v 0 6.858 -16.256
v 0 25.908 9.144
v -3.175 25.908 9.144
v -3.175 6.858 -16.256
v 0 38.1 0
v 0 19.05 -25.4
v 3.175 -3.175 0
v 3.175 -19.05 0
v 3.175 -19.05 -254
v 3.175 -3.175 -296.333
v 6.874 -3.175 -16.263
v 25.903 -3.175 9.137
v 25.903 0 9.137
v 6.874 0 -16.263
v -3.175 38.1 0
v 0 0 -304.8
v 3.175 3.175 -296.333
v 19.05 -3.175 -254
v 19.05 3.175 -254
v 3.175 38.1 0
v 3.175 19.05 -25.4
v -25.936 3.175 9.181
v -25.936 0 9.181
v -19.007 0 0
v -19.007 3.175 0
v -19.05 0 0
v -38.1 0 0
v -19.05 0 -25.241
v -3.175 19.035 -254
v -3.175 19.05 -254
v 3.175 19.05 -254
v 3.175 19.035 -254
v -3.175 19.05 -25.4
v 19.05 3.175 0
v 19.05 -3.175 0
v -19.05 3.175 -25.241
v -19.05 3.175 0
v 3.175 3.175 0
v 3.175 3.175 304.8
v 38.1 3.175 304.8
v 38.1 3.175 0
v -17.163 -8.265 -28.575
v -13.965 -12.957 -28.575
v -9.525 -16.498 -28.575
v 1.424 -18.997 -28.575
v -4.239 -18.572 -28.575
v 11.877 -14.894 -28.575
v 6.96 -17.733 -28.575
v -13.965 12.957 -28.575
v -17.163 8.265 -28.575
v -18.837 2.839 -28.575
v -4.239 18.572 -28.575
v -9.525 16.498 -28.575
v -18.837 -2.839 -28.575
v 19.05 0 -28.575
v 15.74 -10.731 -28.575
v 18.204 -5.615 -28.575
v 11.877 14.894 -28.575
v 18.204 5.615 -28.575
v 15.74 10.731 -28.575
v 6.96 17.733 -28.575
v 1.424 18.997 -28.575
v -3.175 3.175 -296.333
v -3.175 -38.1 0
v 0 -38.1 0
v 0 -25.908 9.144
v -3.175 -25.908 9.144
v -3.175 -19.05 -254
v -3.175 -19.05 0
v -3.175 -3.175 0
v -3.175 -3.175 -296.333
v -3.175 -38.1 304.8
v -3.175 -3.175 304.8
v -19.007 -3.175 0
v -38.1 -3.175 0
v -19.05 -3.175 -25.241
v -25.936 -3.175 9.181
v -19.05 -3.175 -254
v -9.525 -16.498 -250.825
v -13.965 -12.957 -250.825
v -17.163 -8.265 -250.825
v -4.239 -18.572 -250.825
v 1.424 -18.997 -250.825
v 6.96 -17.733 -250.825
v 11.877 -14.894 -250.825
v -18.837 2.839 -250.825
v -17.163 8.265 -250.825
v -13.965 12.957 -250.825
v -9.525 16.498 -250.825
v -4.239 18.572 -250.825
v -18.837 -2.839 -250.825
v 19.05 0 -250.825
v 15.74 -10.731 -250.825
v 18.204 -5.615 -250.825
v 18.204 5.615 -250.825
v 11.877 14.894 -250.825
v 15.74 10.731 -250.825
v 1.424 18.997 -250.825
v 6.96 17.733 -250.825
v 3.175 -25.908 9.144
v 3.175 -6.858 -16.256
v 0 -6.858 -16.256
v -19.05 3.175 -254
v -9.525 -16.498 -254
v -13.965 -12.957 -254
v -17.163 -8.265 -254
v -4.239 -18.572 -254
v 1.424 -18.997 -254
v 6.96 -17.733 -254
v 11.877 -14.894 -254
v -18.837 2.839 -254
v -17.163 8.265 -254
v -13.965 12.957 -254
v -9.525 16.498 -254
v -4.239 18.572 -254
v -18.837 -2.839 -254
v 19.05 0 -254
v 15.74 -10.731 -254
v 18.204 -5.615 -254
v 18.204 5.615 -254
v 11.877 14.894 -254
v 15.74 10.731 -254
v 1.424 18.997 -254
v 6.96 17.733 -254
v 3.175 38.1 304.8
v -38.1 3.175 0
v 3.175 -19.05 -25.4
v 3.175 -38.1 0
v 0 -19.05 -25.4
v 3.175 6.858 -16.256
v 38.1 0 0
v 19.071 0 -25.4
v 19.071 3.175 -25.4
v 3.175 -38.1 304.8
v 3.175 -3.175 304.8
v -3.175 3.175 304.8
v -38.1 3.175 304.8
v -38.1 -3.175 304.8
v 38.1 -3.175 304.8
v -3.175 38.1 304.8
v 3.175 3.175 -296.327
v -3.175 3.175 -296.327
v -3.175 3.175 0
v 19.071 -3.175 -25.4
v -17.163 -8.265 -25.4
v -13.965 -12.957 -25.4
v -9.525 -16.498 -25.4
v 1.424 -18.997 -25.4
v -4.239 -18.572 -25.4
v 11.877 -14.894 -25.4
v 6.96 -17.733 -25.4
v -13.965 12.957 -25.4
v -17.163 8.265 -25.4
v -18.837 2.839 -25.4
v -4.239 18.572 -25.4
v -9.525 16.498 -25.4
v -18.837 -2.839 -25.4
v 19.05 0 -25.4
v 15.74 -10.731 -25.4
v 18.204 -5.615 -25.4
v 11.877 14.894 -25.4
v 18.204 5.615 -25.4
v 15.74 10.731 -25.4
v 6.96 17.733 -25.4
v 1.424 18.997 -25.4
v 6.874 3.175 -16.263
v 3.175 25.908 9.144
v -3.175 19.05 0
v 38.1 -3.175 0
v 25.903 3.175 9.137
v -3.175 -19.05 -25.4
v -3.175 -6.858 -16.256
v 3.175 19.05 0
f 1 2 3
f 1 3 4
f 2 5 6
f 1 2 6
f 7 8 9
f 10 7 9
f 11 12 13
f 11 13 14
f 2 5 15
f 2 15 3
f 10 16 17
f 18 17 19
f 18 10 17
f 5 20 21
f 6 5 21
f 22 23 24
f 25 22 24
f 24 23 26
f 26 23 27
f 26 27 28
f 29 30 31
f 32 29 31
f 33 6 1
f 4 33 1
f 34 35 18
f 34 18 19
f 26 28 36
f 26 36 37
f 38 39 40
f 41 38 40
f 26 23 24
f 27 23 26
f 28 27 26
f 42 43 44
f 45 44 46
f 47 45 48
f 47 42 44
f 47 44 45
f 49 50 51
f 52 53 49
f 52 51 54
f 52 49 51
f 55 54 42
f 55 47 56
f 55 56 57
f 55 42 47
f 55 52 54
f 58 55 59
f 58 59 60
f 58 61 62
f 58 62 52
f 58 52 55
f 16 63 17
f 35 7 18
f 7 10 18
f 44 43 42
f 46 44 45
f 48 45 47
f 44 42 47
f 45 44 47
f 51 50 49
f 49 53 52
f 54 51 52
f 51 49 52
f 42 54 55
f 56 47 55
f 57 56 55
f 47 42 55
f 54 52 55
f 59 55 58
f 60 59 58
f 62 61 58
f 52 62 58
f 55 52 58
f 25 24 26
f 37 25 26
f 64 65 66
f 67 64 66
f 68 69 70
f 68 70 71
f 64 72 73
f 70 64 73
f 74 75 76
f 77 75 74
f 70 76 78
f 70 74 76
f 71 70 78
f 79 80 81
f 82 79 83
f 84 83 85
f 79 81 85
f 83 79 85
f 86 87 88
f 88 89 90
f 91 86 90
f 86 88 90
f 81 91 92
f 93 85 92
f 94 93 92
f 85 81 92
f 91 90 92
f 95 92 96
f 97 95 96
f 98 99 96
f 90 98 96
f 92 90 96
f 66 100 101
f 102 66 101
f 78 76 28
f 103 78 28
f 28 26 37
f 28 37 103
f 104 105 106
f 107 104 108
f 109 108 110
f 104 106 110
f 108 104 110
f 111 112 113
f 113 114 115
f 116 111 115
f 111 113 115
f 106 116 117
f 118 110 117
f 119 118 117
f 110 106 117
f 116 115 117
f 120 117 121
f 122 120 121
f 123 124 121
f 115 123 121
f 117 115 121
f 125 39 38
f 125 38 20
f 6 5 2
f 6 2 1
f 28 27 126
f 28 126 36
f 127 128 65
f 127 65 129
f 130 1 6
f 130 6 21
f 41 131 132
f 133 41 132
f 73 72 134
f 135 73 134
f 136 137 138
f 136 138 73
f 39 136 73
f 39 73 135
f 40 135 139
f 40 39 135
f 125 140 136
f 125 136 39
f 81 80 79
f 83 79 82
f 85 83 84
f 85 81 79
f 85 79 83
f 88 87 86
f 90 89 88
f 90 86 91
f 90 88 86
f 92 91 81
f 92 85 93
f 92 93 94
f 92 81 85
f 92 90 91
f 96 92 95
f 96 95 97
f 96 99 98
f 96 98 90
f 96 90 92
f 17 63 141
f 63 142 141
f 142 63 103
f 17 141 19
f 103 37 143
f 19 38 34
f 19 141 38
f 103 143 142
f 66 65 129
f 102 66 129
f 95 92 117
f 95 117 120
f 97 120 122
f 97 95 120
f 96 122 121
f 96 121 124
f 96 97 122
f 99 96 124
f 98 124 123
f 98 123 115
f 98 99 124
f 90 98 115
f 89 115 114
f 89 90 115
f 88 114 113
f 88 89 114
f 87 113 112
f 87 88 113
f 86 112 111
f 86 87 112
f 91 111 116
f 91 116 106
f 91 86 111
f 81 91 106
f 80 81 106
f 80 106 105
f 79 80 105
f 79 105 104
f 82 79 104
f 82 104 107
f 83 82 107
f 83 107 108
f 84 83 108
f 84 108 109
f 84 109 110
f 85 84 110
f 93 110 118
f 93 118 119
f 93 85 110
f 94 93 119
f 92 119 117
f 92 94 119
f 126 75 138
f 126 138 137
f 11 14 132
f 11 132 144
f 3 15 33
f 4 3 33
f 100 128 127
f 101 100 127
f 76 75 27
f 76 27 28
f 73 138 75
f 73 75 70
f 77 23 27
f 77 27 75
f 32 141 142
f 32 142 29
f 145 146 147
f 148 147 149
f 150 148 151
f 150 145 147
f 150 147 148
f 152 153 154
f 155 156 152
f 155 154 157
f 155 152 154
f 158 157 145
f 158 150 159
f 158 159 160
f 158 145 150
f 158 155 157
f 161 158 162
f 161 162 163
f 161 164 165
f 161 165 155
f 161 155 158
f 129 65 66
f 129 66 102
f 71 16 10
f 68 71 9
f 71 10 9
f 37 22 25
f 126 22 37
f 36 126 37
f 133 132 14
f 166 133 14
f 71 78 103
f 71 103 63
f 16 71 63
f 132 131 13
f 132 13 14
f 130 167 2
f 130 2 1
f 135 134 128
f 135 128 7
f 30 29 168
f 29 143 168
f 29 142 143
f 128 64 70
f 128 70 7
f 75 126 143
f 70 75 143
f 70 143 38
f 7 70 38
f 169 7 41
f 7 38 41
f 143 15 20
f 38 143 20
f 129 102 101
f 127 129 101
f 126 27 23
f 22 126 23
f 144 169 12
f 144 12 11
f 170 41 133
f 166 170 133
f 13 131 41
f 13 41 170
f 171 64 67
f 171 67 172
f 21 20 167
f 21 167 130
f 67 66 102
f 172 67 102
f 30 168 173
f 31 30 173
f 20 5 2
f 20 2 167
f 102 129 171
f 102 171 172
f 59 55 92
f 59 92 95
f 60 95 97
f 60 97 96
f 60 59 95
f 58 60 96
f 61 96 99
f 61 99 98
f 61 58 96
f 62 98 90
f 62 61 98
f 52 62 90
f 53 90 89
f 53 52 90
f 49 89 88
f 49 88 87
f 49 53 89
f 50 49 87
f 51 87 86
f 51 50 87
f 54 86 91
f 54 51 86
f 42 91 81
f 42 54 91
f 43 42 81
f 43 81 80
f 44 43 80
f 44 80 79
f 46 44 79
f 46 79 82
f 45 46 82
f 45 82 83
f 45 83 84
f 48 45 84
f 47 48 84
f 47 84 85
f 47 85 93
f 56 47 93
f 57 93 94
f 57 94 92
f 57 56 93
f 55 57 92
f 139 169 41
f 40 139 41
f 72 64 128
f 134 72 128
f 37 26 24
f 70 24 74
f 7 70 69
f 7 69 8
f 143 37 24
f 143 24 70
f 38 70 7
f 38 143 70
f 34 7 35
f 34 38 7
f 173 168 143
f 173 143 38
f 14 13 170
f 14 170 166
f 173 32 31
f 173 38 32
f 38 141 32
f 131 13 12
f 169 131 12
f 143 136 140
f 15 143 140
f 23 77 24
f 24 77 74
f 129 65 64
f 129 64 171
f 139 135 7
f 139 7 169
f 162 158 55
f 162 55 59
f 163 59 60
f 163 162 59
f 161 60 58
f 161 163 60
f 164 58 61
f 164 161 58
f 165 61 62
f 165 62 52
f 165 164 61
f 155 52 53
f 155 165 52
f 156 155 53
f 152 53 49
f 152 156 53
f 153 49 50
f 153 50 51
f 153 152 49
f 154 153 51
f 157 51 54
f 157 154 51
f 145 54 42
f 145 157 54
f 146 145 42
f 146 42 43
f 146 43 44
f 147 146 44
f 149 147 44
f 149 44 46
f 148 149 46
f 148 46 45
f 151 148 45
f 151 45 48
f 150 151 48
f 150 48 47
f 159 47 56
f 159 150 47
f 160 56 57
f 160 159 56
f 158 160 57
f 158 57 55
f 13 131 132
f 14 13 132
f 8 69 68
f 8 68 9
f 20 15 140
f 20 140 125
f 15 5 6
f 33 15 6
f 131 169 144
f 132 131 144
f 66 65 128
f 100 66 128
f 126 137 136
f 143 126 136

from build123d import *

# Parameters (mm, degrees)
F0_W           = 6.35
F0_H           = 34.925
F0_W_2         = 34.925
F0_H_2         = 6.35
F1_DEPTH       = 304.8
F2_W           = 15.875
F2_H           = 6.35
F2_W_2         = 6.35
F2_H_2         = 15.875
F3_DEPTH       = 254
F5_E4_W        = 31.7372608571
F5_E4_H        = 3.175
F6_DEPTH       = 15.24
F7_DEPTH       = 3.175
F9_E5_W        = 31.8220023402
F9_E5_H        = 3.175
F10_DEPTH      = 15.24
F11_DEPTH      = 3.175
F13_E6_W       = 31.75
F13_E6_H       = 3.175
F14_DEPTH      = 15.24
F15_DEPTH      = 3.175
F16_E7_W       = 31.75
F16_E7_H       = 3.175
F17_DEPTH      = 15.24
F18_DEPTH      = 3.175
F20_START      = -28.575
F19_R          = 19.05
F20_DEPTH      = 222.25
F22_START      = -25.4
F21_R          = 19.05
F22_DEPTH      = 3.175
F24_START      = -250.825
F23_R          = 19.05
F24_DEPTH      = 3.175
F26_DEPTH      = 3.175
F26_DEPTH_BACK = 3.175
F28_DEPTH      = 3.175
F28_DEPTH_BACK = 3.175
F30_DEPTH      = 25.4
F30_DEPTH_BACK = 25.4
F32_DEPTH      = 25.4
F32_DEPTH_BACK = 25.4
F34_DEPTH      = 25.4
F34_DEPTH_BACK = 25.4
F36_DEPTH      = 25.4
F36_DEPTH_BACK = 25.4


with BuildPart() as f1:
    # F0 (on Top) → F1 (new body)
    with BuildSketch(Plane.XY):
        with Locations((0, 20.6375)):
            Rectangle(F0_W, F0_H)
        with Locations((-20.6375, 0)):
            Rectangle(F0_W_2, F0_H_2)
        with Locations((0, -20.6375)):
            Rectangle(F0_W, F0_H)
        Rectangle(F0_W, F0_H_2)
        with Locations((20.6375, 0)):
            Rectangle(F0_W_2, F0_H_2)
    extrude(amount=F1_DEPTH)


with BuildPart() as f3:
    # F2 (on Top) → F3 (new body)
    with BuildSketch(Plane.XY):
        with Locations((11.1125, 0)):
            Rectangle(F2_W, F2_H)
        with Locations((-11.1125, 0)):
            Rectangle(F2_W, F2_H)
        with Locations((0, 11.1125)):
            Rectangle(F2_W_2, F2_H_2)
        with Locations((0, -11.1125)):
            Rectangle(F2_W_2, F2_H_2)
        Rectangle(F2_W_2, F2_H)
    extrude(amount=-F3_DEPTH)

    # F9_E5 (on explicit) → F10 (join)
    with BuildSketch(Plane(origin=(-38.1, 0, 0), x_dir=(0.6024059487, 0, -0.7981898728), z_dir=(-0.7981898728, 0, -0.6024059487))):
        with Locations((15.9110011701, 1.5875)):
            Rectangle(F9_E5_W, F9_E5_H)
    extrude(amount=-F10_DEPTH)


with BuildPart() as f6:
    # F5_E4 (on explicit) → F6 (new body)
    with BuildSketch(Plane(origin=(38.1, 0, 0), x_dir=(-0.5995716076, 0, -0.8003211151), z_dir=(-0.8003211151, 0, 0.5995716076))):
        with Locations((15.8686304286, 1.5875)):
            Rectangle(F5_E4_W, F5_E4_H)
    extrude(amount=F6_DEPTH)


with BuildPart() as f7:
    # F7 (new): a face of the model
    f7_faces = [f6.part.faces().sort_by_distance(p)[0] for p in [
        (22.4871728456, 0, -8.1312643497),
    ]]
    extrude(f7_faces, amount=F7_DEPTH)


with BuildPart() as f11:
    # F11 (new): a face of the model
    f11_faces = [f3.part.faces().sort_by_distance(p)[0] for p in [
        (-26.0093205112, 0, -5.3484628484),
    ]]
    extrude(f11_faces, amount=F11_DEPTH)


with BuildPart() as f14:
    # F13_E6 (on explicit) → F14 (new body)
    with BuildSketch(Plane(origin=(0, 38.1, 0), x_dir=(0, -0.6, -0.8), z_dir=(0, -0.8, 0.6))):
        with Locations((15.875, 1.5875)):
            Rectangle(F13_E6_W, F13_E6_H)
    extrude(amount=F14_DEPTH)


with BuildPart() as f15:
    # F15 (new): a face of the model
    f15_faces = [f14.part.faces().sort_by_distance(p)[0] for p in [
        (0, 22.479, -8.128),
    ]]
    extrude(f15_faces, amount=F15_DEPTH)


with BuildPart() as f17:
    # F16_E7 (on explicit) → F17 (new body)
    with BuildSketch(Plane(origin=(0, -38.1, 0), x_dir=(0, 0.6, -0.8), z_dir=(0, -0.8, -0.6))):
        with Locations((15.875, 1.5875)):
            Rectangle(F16_E7_W, F16_E7_H)
    extrude(amount=-F17_DEPTH)


with BuildPart() as f18:
    # F18 (new): a face of the model
    f18_faces = [f17.part.faces().sort_by_distance(p)[0] for p in [
        (0, -22.479, -8.128),
    ]]
    extrude(f18_faces, amount=F18_DEPTH)


with BuildPart() as f20:
    # F19 (on Top) → F20 (new body)
    with BuildSketch(Plane.XY.offset(F20_START)):
        Circle(F19_R)
    extrude(amount=-F20_DEPTH)


with BuildPart() as f22:
    # F21 (on Top) → F22 (new body)
    with BuildSketch(Plane.XY.offset(F22_START)):
        Circle(F21_R)
    extrude(amount=-F22_DEPTH)


with BuildPart() as f24:
    # F23 (on Top) → F24 (new body)
    with BuildSketch(Plane.XY.offset(F24_START)):
        Circle(F23_R)
    extrude(amount=-F24_DEPTH)


with BuildPart() as f3_1:
    add(f3.part)

    # F25 (on Front) → F26 (join, two sides)
    with BuildSketch(Plane.XZ) as f26_sk:
        Polygon((0, -304.8), (19.05, -254), (-19.05, -254), align=None)
    extrude(amount=F26_DEPTH)
    extrude(f26_sk.sketch, amount=-F26_DEPTH_BACK)

    # F27 (on Right) → F28 (join, two sides)
    with BuildSketch(Plane.YZ) as f28_sk:
        Polygon((19.05, -253.961299397), (-19.05, -254), (0, -304.8), align=None)
    extrude(amount=F28_DEPTH)
    extrude(f28_sk.sketch, amount=-F28_DEPTH_BACK)

    # F29 (on Front) → F30 (cut, two sides)
    with BuildSketch(Plane.XZ) as f30_sk:
        Polygon((14.5053900778, -306.9541752338), (19.05, -254), (0, -304.8), align=None)
    extrude(amount=-F30_DEPTH, mode=Mode.SUBTRACT)
    extrude(f30_sk.sketch, amount=F30_DEPTH_BACK, mode=Mode.SUBTRACT)

    # F31 (on Front) → F32 (cut, two sides)
    with BuildSketch(Plane.XZ) as f32_sk:
        Polygon((0, -304.8), (-19.05, -254), (-17.9964636892, -308.1513562202), align=None)
    extrude(amount=-F32_DEPTH, mode=Mode.SUBTRACT)
    extrude(f32_sk.sketch, amount=F32_DEPTH_BACK, mode=Mode.SUBTRACT)

    # F33 (on Right) → F34 (cut, two sides)
    with BuildSketch(Plane.YZ) as f34_sk:
        Polygon((0, -304.8), (-19.0134039452, -254.0975894796), (-19.4287896156, -254.4830143452), (-21.6469541192, -304.8), align=None)
    extrude(amount=-F34_DEPTH, mode=Mode.SUBTRACT)
    extrude(f34_sk.sketch, amount=F34_DEPTH_BACK, mode=Mode.SUBTRACT)

    # F35 (on Right) → F36 (cut, two sides)
    with BuildSketch(Plane.YZ) as f36_sk:
        Polygon((28.5147875547, -304.8), (19.05, -254), (0, -304.8), align=None)
    extrude(amount=-F36_DEPTH, mode=Mode.SUBTRACT)
    extrude(f36_sk.sketch, amount=F36_DEPTH_BACK, mode=Mode.SUBTRACT)


solid = Compound([f1.part, f6.part, f7.part, f11.part, f14.part, f15.part, f17.part, f18.part, f20.part, f22.part, f24.part, f3_1.part])
